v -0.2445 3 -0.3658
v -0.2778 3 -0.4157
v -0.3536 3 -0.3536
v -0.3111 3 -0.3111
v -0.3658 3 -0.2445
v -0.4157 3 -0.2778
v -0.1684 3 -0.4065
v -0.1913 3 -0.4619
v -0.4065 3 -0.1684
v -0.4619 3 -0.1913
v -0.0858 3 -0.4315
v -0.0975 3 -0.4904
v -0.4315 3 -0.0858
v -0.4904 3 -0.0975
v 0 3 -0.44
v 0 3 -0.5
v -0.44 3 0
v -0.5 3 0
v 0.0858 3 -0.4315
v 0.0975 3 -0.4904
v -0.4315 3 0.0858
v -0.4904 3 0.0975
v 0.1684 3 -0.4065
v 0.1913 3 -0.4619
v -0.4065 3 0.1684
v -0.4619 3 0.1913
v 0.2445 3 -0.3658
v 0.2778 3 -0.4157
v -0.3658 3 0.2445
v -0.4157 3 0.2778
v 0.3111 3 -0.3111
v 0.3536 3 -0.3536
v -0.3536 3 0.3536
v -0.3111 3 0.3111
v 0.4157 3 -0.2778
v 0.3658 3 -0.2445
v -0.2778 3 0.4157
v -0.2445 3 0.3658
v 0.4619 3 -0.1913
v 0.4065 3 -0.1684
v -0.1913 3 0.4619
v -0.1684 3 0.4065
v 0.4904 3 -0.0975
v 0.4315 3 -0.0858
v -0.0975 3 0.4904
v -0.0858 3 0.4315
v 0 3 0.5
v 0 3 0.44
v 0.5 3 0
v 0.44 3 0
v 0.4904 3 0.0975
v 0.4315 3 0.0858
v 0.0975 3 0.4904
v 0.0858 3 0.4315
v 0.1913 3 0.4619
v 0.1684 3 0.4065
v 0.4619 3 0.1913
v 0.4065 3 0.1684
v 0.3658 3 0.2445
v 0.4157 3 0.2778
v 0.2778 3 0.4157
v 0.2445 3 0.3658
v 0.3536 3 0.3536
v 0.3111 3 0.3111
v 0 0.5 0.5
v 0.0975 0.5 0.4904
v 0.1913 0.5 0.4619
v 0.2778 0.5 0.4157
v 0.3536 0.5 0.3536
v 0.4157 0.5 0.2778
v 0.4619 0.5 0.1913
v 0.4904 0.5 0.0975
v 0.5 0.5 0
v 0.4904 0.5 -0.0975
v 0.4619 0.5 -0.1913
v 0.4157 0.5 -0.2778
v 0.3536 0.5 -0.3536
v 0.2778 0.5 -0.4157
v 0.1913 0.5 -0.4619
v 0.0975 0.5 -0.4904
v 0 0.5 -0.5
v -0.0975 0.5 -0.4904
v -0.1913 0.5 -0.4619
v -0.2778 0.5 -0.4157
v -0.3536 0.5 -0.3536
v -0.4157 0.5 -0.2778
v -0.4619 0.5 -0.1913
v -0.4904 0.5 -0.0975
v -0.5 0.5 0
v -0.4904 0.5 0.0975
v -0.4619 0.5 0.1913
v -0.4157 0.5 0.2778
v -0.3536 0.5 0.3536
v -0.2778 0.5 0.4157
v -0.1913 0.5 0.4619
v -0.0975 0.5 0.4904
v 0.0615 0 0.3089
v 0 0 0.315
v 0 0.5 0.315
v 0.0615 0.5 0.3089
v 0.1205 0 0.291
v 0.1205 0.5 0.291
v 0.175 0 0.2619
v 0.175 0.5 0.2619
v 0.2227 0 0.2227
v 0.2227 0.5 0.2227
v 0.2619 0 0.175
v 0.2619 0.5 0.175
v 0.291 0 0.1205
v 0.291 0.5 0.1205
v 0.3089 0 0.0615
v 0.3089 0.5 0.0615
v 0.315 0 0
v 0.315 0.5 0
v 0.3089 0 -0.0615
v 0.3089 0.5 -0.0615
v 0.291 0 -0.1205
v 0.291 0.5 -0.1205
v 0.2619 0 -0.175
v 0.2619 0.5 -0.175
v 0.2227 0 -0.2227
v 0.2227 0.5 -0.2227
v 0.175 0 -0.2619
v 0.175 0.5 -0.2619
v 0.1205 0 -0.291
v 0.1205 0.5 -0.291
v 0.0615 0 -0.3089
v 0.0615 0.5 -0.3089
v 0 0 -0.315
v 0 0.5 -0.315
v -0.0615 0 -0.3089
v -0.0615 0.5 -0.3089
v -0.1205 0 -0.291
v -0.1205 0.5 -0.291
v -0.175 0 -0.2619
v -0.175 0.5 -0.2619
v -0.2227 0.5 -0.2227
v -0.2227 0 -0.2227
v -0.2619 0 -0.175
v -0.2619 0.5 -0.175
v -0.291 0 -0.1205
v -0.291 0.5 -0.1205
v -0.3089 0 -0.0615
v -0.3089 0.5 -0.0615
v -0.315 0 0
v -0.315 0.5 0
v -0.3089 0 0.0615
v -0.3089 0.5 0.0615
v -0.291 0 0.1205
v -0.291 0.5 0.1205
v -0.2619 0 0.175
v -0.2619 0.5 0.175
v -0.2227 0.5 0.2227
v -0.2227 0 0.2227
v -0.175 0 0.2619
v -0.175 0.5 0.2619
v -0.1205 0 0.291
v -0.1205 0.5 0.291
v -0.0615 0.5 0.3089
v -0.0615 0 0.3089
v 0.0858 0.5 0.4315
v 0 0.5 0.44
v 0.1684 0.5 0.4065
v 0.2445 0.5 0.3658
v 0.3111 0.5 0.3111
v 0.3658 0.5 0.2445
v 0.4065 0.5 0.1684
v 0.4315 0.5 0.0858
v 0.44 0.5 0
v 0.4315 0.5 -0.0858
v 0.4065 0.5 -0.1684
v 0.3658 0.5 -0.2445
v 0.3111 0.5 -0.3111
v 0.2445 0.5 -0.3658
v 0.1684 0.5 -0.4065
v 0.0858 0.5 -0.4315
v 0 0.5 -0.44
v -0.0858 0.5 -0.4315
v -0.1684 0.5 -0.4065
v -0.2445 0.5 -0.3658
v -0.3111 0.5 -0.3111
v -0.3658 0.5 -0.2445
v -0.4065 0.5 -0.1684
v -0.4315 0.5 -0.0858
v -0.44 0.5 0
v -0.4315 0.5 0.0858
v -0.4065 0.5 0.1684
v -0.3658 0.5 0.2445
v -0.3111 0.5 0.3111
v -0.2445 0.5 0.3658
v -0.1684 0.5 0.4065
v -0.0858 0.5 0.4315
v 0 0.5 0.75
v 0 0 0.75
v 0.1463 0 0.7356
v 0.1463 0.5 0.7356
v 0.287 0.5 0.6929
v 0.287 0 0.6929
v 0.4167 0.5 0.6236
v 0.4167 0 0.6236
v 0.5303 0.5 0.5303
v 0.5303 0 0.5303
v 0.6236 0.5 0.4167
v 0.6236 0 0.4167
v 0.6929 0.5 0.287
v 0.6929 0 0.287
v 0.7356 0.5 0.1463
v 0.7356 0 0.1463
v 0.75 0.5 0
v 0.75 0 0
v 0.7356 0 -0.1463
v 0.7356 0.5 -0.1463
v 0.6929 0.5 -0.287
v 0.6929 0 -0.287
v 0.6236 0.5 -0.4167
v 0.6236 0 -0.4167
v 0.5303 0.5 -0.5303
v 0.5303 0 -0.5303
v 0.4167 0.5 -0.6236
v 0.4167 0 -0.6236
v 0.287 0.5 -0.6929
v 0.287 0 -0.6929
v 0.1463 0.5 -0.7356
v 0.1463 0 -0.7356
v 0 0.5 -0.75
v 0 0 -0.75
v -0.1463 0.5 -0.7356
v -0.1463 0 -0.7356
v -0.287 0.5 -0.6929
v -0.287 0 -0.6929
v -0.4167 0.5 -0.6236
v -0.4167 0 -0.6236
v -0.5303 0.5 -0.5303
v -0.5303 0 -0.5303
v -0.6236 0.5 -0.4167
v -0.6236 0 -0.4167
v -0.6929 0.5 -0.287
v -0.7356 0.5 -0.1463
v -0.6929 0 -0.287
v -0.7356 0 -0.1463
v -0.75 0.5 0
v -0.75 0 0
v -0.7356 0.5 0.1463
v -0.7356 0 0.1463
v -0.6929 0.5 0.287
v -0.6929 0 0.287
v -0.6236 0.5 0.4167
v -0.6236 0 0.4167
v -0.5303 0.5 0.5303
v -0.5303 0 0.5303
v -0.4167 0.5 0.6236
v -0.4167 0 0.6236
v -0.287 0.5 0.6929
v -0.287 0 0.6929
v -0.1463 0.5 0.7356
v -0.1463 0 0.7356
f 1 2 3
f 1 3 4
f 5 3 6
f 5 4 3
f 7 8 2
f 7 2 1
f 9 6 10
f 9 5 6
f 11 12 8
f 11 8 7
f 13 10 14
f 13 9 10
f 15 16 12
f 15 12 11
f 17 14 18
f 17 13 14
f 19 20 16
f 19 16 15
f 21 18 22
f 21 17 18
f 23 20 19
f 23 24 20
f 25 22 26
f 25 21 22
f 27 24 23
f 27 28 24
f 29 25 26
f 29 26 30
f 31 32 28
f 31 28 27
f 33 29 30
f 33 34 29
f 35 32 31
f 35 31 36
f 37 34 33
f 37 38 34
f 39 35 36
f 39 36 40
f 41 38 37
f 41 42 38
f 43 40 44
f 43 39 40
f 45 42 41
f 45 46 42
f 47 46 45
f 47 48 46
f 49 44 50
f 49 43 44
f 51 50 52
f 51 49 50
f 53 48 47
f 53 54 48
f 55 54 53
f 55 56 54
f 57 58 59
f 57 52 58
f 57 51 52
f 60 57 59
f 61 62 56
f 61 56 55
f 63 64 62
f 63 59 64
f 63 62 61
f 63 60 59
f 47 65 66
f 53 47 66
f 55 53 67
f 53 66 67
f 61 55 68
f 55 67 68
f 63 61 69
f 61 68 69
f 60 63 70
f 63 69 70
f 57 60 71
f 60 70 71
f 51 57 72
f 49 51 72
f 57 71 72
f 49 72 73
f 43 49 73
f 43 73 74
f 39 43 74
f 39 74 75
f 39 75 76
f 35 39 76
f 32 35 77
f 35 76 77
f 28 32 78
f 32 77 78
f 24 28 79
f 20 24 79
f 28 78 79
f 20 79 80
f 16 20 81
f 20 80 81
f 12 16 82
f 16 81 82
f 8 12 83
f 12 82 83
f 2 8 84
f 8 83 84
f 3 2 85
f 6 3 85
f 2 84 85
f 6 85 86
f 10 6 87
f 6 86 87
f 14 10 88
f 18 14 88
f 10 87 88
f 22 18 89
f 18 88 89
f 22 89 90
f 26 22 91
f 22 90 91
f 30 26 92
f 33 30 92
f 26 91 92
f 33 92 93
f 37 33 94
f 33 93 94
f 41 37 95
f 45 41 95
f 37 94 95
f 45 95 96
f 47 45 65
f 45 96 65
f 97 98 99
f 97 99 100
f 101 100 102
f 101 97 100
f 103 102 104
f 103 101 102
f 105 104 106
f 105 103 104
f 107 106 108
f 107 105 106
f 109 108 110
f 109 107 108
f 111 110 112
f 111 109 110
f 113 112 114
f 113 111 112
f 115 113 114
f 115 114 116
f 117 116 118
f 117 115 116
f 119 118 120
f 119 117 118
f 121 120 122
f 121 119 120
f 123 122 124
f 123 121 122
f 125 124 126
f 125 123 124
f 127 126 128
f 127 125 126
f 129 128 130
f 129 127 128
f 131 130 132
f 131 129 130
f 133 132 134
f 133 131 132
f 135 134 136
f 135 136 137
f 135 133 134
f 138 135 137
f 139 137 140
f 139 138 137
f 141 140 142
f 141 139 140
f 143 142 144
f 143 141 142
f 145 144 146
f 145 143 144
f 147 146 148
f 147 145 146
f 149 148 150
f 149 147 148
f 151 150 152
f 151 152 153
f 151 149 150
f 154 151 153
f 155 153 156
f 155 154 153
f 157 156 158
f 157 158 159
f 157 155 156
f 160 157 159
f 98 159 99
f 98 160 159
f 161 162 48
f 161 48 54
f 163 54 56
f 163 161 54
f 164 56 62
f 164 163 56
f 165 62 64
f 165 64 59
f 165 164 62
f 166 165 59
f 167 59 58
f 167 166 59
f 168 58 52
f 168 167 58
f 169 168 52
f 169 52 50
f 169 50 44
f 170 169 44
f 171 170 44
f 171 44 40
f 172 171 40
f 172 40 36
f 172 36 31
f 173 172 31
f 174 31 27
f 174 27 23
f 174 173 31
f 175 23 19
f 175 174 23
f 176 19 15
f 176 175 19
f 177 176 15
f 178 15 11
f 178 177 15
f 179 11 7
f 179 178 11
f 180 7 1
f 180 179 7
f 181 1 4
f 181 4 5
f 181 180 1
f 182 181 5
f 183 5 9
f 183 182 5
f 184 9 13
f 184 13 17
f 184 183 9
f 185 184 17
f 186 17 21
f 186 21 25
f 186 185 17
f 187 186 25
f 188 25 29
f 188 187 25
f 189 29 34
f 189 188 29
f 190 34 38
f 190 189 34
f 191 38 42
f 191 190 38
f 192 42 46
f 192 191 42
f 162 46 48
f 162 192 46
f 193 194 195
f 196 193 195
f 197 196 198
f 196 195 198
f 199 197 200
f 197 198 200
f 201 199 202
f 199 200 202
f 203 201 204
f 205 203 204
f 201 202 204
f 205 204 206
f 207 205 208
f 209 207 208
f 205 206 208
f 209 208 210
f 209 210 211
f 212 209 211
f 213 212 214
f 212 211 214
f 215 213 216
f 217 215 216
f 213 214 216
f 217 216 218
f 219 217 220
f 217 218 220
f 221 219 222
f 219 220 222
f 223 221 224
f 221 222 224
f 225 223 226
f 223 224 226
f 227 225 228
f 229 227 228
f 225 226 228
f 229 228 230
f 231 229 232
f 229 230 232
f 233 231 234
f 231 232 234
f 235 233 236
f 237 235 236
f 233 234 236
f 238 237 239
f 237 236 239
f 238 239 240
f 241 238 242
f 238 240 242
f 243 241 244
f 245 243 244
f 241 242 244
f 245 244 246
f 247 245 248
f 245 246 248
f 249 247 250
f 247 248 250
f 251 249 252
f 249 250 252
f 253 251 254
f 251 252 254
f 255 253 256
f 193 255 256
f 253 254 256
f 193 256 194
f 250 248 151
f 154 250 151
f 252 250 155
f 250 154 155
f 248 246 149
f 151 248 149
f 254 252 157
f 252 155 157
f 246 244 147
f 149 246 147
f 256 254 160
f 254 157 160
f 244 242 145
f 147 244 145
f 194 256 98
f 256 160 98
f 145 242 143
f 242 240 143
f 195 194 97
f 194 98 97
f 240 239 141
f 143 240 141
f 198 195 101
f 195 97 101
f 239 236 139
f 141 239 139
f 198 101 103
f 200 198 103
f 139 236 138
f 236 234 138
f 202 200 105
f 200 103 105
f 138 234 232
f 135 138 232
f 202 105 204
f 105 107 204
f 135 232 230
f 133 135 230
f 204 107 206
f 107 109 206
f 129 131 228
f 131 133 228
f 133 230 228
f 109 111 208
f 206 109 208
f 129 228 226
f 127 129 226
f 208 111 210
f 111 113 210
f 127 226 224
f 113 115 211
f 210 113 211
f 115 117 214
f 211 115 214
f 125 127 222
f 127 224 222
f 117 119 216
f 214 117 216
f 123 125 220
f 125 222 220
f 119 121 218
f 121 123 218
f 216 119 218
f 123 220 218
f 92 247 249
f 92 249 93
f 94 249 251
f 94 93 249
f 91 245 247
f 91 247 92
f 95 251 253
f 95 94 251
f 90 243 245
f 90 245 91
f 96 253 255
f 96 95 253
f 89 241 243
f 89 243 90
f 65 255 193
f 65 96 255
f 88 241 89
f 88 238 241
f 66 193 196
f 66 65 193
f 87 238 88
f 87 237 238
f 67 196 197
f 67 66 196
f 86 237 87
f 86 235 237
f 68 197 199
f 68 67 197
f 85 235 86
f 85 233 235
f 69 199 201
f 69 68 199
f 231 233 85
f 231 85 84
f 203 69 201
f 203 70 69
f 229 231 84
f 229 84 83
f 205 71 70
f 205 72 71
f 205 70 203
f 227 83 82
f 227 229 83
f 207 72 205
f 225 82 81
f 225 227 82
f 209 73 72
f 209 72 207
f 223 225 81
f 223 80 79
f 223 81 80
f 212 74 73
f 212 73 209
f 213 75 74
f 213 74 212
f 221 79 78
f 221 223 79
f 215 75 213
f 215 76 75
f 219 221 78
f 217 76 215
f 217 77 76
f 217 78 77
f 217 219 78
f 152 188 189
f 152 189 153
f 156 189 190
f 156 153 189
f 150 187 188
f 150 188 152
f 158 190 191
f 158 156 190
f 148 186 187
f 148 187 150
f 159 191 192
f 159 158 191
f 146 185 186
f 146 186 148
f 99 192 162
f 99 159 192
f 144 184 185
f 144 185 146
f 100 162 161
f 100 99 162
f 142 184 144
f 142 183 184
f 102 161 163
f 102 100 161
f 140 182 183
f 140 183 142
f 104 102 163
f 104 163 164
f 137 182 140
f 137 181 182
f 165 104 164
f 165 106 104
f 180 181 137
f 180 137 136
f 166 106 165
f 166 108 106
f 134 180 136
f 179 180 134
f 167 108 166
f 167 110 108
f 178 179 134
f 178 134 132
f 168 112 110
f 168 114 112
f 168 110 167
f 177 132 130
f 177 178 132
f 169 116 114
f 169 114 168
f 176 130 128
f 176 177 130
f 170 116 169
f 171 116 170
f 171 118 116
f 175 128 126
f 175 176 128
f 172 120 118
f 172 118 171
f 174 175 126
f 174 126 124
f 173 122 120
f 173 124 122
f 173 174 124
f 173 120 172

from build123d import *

# Parameters (mm, degrees)
SKETCH2_R           = 0.75
SKETCH2_R_2         = 0.5
SKETCH2_R_3         = 0.44
SKETCH2_R_4         = 0.315
BOSS_EXTRUDE1_DEPTH = 0.5
BOSS_EXTRUDE2_START = 0.5
SKETCH2_3_R         = 0.5
SKETCH2_3_R_2       = 0.44
BOSS_EXTRUDE2_DEPTH = 2.5


with BuildPart() as part:
    # Sketch2 → Boss-Extrude1 (new body)
    # profile 1 of 3: a face of its own
    with BuildSketch(Plane(origin=(0, 0, 0), x_dir=(1, 0, 0), z_dir=(0, 1, 0))):
        with Locations(Location((0, 0, 0), (0, 0, 270))):
            Circle(SKETCH2_R)
        Circle(SKETCH2_R_2, mode=Mode.SUBTRACT)
    # profile 2 of 3: a face of its own
    with BuildSketch(Plane(origin=(0, 0, 0), x_dir=(1, 0, 0), z_dir=(0, 1, 0))):
        Circle(SKETCH2_R_2)
        Circle(SKETCH2_R_3, mode=Mode.SUBTRACT)
    # profile 3 of 3: a face of its own
    with BuildSketch(Plane(origin=(0, 0, 0), x_dir=(1, 0, 0), z_dir=(0, 1, 0))):
        Circle(SKETCH2_R_3)
        with Locations(Location((0, 0, 0), (0, 0, 270))):
            Circle(SKETCH2_R_4, mode=Mode.SUBTRACT)
    extrude(amount=BOSS_EXTRUDE1_DEPTH)

    # Sketch2<3> → Boss-Extrude2 (add)
    with BuildSketch(Plane(origin=(0, 0, 0), x_dir=(1, 0, 0), z_dir=(0, 1, 0)).offset(BOSS_EXTRUDE2_START)):
        with Locations(Location((0, 0, 0), (0, 0, 270))):
            Circle(SKETCH2_3_R)
        with Locations(Location((0, 0, 0), (0, 0, 270))):
            Circle(SKETCH2_3_R_2, mode=Mode.SUBTRACT)
    extrude(amount=BOSS_EXTRUDE2_DEPTH)


solid = part.part
